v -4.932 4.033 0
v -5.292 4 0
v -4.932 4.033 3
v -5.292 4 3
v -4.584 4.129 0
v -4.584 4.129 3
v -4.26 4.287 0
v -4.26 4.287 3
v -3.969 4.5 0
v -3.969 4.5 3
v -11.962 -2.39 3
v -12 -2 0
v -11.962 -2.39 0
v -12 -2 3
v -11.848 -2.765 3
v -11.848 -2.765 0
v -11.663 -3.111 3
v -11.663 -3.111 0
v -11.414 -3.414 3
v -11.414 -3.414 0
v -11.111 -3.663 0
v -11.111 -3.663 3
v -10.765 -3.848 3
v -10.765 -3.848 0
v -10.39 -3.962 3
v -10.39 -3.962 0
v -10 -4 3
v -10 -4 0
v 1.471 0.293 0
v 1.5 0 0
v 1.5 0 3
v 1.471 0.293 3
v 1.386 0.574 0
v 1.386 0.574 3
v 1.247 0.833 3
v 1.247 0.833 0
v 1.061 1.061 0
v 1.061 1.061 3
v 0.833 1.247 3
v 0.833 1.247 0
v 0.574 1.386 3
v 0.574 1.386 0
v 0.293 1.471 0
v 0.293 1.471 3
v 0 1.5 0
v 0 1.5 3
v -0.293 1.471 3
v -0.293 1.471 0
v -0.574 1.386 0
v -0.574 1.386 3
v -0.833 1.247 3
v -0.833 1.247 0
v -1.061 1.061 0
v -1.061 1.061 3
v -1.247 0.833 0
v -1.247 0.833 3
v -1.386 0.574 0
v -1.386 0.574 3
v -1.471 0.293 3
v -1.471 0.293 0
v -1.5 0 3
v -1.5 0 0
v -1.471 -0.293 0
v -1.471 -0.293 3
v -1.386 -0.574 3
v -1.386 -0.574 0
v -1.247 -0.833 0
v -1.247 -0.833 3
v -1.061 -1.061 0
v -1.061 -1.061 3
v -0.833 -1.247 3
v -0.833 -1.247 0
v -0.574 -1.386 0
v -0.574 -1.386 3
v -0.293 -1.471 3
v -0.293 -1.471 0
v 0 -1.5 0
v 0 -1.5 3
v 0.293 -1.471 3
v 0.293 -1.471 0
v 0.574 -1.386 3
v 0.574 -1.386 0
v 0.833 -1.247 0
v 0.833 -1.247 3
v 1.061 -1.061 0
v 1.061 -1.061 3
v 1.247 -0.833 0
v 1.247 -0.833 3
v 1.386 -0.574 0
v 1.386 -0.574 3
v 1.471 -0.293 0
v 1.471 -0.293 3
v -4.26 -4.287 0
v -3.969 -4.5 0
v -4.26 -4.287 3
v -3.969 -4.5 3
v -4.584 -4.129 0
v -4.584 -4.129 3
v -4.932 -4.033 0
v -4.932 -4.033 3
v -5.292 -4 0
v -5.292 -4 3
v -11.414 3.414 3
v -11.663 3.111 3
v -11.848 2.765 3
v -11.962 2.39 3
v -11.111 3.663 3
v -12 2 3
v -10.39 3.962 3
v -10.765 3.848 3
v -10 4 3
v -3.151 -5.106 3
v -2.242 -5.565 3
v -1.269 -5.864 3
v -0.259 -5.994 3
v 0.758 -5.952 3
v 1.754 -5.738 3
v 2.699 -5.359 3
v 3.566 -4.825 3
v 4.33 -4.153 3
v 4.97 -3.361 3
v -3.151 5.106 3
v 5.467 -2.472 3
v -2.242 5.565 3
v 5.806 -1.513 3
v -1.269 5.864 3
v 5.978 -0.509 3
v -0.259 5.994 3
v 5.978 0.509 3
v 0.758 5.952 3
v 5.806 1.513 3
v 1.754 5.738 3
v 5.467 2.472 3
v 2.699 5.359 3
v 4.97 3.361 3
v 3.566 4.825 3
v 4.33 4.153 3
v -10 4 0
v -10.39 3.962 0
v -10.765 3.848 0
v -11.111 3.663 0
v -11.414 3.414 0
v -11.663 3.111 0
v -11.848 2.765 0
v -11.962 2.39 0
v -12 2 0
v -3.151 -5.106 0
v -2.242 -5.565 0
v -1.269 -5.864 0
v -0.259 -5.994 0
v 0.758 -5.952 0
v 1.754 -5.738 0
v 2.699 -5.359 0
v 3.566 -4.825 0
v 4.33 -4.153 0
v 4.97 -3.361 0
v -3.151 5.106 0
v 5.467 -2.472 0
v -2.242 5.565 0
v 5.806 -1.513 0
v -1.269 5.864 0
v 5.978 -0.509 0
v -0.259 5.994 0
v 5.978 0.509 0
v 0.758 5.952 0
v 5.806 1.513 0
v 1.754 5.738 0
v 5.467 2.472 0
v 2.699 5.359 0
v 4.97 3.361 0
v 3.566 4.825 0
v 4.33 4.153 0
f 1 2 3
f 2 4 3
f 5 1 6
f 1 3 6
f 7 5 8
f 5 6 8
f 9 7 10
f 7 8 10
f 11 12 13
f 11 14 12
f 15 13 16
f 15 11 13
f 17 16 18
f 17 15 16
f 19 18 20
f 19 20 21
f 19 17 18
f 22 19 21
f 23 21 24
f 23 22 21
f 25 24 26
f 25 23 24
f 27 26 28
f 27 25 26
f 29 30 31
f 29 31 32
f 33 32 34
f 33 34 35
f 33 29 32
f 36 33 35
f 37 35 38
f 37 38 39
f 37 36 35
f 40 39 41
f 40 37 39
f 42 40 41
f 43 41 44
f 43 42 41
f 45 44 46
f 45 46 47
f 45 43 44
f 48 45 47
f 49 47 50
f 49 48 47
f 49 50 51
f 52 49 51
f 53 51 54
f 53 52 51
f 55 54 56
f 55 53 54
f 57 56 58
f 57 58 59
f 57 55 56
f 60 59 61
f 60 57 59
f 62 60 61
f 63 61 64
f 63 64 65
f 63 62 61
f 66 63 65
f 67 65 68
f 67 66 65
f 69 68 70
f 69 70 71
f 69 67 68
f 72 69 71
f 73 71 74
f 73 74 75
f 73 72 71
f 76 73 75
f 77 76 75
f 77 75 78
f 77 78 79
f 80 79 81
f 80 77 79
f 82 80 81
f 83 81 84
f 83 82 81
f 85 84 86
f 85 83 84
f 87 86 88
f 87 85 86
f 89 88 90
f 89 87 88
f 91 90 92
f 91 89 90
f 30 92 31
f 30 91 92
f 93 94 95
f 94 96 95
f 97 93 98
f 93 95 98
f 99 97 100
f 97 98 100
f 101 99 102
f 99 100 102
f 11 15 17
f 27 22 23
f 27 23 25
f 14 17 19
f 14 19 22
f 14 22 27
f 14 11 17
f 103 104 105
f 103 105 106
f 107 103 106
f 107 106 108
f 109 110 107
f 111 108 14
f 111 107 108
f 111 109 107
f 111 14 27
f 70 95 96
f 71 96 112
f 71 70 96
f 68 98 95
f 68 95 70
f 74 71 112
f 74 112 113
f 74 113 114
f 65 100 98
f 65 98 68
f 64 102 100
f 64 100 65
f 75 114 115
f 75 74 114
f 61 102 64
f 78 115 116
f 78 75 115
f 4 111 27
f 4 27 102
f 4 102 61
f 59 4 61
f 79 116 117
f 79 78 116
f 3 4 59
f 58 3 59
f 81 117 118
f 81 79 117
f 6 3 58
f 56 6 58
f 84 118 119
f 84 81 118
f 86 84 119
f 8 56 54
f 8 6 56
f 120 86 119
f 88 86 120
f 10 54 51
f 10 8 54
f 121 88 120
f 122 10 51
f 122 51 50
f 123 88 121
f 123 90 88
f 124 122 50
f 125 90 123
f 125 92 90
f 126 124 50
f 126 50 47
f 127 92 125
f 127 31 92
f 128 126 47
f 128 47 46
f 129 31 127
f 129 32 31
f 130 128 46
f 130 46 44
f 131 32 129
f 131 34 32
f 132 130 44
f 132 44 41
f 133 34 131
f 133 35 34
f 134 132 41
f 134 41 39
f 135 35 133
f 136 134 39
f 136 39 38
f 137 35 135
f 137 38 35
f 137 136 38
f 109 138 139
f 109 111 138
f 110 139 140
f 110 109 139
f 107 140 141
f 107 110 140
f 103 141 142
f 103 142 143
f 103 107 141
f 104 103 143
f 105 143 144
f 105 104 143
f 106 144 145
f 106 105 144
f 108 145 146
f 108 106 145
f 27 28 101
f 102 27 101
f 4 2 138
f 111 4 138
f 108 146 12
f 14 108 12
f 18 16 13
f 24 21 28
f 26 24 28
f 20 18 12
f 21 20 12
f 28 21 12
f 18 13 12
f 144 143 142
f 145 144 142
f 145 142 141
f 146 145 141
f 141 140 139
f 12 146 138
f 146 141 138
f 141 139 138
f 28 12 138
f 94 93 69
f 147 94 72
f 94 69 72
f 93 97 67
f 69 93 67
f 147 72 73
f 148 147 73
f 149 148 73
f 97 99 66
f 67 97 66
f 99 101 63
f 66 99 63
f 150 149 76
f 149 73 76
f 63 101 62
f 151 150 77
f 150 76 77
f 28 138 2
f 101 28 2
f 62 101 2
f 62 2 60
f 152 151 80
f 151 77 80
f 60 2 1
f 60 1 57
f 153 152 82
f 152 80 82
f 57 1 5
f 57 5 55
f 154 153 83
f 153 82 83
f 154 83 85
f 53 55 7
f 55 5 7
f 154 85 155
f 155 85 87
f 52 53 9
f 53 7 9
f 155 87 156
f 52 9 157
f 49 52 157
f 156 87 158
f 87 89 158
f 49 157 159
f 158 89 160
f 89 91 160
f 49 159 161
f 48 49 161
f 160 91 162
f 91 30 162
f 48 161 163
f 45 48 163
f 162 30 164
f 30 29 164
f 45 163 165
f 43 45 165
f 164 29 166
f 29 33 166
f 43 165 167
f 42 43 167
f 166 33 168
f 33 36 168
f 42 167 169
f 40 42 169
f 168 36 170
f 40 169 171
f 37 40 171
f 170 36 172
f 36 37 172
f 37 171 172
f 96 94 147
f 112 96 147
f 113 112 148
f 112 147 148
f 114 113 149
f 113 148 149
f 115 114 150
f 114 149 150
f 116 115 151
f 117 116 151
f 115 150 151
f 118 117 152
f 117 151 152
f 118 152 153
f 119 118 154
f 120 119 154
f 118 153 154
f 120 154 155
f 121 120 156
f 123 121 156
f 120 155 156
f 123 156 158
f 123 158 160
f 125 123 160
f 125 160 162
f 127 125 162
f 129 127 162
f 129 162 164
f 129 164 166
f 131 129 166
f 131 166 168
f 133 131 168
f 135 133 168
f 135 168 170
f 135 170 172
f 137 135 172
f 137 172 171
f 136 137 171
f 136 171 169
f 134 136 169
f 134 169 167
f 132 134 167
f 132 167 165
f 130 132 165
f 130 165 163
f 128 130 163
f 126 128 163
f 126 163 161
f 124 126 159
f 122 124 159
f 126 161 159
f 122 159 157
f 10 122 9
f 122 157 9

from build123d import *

# Parameters (mm, degrees)
SKETCH1_R           = 1.5
BOSS_EXTRUDE1_DEPTH = 3
FILLET1_R           = 2


with BuildPart() as part:
    # Sketch1 → Boss-Extrude1 (new body)
    with BuildSketch(Plane.XY):
        with BuildLine():
            Line((-4.472135955, 4), (-12, 4))
            Line((-12, 4), (-12, -4))
            Line((-12, -4), (-4.472135955, -4))
            ThreePointArc((-4.472135955, -4), (6, 0), (-4.472135955, 4))
        make_face()
        Circle(SKETCH1_R, mode=Mode.SUBTRACT)
    extrude(amount=BOSS_EXTRUDE1_DEPTH)

    # Fillet1
    fillet1_edges = [part.edges().sort_by_distance(p)[0] for p in [
        (-4.472135955, -4, 1.5),
        (-12, -4, 1.5),
        (-12, 4, 1.5),
        (-4.472135955, 4, 1.5),
    ]]
    fillet(fillet1_edges, radius=FILLET1_R)


solid = part.part
